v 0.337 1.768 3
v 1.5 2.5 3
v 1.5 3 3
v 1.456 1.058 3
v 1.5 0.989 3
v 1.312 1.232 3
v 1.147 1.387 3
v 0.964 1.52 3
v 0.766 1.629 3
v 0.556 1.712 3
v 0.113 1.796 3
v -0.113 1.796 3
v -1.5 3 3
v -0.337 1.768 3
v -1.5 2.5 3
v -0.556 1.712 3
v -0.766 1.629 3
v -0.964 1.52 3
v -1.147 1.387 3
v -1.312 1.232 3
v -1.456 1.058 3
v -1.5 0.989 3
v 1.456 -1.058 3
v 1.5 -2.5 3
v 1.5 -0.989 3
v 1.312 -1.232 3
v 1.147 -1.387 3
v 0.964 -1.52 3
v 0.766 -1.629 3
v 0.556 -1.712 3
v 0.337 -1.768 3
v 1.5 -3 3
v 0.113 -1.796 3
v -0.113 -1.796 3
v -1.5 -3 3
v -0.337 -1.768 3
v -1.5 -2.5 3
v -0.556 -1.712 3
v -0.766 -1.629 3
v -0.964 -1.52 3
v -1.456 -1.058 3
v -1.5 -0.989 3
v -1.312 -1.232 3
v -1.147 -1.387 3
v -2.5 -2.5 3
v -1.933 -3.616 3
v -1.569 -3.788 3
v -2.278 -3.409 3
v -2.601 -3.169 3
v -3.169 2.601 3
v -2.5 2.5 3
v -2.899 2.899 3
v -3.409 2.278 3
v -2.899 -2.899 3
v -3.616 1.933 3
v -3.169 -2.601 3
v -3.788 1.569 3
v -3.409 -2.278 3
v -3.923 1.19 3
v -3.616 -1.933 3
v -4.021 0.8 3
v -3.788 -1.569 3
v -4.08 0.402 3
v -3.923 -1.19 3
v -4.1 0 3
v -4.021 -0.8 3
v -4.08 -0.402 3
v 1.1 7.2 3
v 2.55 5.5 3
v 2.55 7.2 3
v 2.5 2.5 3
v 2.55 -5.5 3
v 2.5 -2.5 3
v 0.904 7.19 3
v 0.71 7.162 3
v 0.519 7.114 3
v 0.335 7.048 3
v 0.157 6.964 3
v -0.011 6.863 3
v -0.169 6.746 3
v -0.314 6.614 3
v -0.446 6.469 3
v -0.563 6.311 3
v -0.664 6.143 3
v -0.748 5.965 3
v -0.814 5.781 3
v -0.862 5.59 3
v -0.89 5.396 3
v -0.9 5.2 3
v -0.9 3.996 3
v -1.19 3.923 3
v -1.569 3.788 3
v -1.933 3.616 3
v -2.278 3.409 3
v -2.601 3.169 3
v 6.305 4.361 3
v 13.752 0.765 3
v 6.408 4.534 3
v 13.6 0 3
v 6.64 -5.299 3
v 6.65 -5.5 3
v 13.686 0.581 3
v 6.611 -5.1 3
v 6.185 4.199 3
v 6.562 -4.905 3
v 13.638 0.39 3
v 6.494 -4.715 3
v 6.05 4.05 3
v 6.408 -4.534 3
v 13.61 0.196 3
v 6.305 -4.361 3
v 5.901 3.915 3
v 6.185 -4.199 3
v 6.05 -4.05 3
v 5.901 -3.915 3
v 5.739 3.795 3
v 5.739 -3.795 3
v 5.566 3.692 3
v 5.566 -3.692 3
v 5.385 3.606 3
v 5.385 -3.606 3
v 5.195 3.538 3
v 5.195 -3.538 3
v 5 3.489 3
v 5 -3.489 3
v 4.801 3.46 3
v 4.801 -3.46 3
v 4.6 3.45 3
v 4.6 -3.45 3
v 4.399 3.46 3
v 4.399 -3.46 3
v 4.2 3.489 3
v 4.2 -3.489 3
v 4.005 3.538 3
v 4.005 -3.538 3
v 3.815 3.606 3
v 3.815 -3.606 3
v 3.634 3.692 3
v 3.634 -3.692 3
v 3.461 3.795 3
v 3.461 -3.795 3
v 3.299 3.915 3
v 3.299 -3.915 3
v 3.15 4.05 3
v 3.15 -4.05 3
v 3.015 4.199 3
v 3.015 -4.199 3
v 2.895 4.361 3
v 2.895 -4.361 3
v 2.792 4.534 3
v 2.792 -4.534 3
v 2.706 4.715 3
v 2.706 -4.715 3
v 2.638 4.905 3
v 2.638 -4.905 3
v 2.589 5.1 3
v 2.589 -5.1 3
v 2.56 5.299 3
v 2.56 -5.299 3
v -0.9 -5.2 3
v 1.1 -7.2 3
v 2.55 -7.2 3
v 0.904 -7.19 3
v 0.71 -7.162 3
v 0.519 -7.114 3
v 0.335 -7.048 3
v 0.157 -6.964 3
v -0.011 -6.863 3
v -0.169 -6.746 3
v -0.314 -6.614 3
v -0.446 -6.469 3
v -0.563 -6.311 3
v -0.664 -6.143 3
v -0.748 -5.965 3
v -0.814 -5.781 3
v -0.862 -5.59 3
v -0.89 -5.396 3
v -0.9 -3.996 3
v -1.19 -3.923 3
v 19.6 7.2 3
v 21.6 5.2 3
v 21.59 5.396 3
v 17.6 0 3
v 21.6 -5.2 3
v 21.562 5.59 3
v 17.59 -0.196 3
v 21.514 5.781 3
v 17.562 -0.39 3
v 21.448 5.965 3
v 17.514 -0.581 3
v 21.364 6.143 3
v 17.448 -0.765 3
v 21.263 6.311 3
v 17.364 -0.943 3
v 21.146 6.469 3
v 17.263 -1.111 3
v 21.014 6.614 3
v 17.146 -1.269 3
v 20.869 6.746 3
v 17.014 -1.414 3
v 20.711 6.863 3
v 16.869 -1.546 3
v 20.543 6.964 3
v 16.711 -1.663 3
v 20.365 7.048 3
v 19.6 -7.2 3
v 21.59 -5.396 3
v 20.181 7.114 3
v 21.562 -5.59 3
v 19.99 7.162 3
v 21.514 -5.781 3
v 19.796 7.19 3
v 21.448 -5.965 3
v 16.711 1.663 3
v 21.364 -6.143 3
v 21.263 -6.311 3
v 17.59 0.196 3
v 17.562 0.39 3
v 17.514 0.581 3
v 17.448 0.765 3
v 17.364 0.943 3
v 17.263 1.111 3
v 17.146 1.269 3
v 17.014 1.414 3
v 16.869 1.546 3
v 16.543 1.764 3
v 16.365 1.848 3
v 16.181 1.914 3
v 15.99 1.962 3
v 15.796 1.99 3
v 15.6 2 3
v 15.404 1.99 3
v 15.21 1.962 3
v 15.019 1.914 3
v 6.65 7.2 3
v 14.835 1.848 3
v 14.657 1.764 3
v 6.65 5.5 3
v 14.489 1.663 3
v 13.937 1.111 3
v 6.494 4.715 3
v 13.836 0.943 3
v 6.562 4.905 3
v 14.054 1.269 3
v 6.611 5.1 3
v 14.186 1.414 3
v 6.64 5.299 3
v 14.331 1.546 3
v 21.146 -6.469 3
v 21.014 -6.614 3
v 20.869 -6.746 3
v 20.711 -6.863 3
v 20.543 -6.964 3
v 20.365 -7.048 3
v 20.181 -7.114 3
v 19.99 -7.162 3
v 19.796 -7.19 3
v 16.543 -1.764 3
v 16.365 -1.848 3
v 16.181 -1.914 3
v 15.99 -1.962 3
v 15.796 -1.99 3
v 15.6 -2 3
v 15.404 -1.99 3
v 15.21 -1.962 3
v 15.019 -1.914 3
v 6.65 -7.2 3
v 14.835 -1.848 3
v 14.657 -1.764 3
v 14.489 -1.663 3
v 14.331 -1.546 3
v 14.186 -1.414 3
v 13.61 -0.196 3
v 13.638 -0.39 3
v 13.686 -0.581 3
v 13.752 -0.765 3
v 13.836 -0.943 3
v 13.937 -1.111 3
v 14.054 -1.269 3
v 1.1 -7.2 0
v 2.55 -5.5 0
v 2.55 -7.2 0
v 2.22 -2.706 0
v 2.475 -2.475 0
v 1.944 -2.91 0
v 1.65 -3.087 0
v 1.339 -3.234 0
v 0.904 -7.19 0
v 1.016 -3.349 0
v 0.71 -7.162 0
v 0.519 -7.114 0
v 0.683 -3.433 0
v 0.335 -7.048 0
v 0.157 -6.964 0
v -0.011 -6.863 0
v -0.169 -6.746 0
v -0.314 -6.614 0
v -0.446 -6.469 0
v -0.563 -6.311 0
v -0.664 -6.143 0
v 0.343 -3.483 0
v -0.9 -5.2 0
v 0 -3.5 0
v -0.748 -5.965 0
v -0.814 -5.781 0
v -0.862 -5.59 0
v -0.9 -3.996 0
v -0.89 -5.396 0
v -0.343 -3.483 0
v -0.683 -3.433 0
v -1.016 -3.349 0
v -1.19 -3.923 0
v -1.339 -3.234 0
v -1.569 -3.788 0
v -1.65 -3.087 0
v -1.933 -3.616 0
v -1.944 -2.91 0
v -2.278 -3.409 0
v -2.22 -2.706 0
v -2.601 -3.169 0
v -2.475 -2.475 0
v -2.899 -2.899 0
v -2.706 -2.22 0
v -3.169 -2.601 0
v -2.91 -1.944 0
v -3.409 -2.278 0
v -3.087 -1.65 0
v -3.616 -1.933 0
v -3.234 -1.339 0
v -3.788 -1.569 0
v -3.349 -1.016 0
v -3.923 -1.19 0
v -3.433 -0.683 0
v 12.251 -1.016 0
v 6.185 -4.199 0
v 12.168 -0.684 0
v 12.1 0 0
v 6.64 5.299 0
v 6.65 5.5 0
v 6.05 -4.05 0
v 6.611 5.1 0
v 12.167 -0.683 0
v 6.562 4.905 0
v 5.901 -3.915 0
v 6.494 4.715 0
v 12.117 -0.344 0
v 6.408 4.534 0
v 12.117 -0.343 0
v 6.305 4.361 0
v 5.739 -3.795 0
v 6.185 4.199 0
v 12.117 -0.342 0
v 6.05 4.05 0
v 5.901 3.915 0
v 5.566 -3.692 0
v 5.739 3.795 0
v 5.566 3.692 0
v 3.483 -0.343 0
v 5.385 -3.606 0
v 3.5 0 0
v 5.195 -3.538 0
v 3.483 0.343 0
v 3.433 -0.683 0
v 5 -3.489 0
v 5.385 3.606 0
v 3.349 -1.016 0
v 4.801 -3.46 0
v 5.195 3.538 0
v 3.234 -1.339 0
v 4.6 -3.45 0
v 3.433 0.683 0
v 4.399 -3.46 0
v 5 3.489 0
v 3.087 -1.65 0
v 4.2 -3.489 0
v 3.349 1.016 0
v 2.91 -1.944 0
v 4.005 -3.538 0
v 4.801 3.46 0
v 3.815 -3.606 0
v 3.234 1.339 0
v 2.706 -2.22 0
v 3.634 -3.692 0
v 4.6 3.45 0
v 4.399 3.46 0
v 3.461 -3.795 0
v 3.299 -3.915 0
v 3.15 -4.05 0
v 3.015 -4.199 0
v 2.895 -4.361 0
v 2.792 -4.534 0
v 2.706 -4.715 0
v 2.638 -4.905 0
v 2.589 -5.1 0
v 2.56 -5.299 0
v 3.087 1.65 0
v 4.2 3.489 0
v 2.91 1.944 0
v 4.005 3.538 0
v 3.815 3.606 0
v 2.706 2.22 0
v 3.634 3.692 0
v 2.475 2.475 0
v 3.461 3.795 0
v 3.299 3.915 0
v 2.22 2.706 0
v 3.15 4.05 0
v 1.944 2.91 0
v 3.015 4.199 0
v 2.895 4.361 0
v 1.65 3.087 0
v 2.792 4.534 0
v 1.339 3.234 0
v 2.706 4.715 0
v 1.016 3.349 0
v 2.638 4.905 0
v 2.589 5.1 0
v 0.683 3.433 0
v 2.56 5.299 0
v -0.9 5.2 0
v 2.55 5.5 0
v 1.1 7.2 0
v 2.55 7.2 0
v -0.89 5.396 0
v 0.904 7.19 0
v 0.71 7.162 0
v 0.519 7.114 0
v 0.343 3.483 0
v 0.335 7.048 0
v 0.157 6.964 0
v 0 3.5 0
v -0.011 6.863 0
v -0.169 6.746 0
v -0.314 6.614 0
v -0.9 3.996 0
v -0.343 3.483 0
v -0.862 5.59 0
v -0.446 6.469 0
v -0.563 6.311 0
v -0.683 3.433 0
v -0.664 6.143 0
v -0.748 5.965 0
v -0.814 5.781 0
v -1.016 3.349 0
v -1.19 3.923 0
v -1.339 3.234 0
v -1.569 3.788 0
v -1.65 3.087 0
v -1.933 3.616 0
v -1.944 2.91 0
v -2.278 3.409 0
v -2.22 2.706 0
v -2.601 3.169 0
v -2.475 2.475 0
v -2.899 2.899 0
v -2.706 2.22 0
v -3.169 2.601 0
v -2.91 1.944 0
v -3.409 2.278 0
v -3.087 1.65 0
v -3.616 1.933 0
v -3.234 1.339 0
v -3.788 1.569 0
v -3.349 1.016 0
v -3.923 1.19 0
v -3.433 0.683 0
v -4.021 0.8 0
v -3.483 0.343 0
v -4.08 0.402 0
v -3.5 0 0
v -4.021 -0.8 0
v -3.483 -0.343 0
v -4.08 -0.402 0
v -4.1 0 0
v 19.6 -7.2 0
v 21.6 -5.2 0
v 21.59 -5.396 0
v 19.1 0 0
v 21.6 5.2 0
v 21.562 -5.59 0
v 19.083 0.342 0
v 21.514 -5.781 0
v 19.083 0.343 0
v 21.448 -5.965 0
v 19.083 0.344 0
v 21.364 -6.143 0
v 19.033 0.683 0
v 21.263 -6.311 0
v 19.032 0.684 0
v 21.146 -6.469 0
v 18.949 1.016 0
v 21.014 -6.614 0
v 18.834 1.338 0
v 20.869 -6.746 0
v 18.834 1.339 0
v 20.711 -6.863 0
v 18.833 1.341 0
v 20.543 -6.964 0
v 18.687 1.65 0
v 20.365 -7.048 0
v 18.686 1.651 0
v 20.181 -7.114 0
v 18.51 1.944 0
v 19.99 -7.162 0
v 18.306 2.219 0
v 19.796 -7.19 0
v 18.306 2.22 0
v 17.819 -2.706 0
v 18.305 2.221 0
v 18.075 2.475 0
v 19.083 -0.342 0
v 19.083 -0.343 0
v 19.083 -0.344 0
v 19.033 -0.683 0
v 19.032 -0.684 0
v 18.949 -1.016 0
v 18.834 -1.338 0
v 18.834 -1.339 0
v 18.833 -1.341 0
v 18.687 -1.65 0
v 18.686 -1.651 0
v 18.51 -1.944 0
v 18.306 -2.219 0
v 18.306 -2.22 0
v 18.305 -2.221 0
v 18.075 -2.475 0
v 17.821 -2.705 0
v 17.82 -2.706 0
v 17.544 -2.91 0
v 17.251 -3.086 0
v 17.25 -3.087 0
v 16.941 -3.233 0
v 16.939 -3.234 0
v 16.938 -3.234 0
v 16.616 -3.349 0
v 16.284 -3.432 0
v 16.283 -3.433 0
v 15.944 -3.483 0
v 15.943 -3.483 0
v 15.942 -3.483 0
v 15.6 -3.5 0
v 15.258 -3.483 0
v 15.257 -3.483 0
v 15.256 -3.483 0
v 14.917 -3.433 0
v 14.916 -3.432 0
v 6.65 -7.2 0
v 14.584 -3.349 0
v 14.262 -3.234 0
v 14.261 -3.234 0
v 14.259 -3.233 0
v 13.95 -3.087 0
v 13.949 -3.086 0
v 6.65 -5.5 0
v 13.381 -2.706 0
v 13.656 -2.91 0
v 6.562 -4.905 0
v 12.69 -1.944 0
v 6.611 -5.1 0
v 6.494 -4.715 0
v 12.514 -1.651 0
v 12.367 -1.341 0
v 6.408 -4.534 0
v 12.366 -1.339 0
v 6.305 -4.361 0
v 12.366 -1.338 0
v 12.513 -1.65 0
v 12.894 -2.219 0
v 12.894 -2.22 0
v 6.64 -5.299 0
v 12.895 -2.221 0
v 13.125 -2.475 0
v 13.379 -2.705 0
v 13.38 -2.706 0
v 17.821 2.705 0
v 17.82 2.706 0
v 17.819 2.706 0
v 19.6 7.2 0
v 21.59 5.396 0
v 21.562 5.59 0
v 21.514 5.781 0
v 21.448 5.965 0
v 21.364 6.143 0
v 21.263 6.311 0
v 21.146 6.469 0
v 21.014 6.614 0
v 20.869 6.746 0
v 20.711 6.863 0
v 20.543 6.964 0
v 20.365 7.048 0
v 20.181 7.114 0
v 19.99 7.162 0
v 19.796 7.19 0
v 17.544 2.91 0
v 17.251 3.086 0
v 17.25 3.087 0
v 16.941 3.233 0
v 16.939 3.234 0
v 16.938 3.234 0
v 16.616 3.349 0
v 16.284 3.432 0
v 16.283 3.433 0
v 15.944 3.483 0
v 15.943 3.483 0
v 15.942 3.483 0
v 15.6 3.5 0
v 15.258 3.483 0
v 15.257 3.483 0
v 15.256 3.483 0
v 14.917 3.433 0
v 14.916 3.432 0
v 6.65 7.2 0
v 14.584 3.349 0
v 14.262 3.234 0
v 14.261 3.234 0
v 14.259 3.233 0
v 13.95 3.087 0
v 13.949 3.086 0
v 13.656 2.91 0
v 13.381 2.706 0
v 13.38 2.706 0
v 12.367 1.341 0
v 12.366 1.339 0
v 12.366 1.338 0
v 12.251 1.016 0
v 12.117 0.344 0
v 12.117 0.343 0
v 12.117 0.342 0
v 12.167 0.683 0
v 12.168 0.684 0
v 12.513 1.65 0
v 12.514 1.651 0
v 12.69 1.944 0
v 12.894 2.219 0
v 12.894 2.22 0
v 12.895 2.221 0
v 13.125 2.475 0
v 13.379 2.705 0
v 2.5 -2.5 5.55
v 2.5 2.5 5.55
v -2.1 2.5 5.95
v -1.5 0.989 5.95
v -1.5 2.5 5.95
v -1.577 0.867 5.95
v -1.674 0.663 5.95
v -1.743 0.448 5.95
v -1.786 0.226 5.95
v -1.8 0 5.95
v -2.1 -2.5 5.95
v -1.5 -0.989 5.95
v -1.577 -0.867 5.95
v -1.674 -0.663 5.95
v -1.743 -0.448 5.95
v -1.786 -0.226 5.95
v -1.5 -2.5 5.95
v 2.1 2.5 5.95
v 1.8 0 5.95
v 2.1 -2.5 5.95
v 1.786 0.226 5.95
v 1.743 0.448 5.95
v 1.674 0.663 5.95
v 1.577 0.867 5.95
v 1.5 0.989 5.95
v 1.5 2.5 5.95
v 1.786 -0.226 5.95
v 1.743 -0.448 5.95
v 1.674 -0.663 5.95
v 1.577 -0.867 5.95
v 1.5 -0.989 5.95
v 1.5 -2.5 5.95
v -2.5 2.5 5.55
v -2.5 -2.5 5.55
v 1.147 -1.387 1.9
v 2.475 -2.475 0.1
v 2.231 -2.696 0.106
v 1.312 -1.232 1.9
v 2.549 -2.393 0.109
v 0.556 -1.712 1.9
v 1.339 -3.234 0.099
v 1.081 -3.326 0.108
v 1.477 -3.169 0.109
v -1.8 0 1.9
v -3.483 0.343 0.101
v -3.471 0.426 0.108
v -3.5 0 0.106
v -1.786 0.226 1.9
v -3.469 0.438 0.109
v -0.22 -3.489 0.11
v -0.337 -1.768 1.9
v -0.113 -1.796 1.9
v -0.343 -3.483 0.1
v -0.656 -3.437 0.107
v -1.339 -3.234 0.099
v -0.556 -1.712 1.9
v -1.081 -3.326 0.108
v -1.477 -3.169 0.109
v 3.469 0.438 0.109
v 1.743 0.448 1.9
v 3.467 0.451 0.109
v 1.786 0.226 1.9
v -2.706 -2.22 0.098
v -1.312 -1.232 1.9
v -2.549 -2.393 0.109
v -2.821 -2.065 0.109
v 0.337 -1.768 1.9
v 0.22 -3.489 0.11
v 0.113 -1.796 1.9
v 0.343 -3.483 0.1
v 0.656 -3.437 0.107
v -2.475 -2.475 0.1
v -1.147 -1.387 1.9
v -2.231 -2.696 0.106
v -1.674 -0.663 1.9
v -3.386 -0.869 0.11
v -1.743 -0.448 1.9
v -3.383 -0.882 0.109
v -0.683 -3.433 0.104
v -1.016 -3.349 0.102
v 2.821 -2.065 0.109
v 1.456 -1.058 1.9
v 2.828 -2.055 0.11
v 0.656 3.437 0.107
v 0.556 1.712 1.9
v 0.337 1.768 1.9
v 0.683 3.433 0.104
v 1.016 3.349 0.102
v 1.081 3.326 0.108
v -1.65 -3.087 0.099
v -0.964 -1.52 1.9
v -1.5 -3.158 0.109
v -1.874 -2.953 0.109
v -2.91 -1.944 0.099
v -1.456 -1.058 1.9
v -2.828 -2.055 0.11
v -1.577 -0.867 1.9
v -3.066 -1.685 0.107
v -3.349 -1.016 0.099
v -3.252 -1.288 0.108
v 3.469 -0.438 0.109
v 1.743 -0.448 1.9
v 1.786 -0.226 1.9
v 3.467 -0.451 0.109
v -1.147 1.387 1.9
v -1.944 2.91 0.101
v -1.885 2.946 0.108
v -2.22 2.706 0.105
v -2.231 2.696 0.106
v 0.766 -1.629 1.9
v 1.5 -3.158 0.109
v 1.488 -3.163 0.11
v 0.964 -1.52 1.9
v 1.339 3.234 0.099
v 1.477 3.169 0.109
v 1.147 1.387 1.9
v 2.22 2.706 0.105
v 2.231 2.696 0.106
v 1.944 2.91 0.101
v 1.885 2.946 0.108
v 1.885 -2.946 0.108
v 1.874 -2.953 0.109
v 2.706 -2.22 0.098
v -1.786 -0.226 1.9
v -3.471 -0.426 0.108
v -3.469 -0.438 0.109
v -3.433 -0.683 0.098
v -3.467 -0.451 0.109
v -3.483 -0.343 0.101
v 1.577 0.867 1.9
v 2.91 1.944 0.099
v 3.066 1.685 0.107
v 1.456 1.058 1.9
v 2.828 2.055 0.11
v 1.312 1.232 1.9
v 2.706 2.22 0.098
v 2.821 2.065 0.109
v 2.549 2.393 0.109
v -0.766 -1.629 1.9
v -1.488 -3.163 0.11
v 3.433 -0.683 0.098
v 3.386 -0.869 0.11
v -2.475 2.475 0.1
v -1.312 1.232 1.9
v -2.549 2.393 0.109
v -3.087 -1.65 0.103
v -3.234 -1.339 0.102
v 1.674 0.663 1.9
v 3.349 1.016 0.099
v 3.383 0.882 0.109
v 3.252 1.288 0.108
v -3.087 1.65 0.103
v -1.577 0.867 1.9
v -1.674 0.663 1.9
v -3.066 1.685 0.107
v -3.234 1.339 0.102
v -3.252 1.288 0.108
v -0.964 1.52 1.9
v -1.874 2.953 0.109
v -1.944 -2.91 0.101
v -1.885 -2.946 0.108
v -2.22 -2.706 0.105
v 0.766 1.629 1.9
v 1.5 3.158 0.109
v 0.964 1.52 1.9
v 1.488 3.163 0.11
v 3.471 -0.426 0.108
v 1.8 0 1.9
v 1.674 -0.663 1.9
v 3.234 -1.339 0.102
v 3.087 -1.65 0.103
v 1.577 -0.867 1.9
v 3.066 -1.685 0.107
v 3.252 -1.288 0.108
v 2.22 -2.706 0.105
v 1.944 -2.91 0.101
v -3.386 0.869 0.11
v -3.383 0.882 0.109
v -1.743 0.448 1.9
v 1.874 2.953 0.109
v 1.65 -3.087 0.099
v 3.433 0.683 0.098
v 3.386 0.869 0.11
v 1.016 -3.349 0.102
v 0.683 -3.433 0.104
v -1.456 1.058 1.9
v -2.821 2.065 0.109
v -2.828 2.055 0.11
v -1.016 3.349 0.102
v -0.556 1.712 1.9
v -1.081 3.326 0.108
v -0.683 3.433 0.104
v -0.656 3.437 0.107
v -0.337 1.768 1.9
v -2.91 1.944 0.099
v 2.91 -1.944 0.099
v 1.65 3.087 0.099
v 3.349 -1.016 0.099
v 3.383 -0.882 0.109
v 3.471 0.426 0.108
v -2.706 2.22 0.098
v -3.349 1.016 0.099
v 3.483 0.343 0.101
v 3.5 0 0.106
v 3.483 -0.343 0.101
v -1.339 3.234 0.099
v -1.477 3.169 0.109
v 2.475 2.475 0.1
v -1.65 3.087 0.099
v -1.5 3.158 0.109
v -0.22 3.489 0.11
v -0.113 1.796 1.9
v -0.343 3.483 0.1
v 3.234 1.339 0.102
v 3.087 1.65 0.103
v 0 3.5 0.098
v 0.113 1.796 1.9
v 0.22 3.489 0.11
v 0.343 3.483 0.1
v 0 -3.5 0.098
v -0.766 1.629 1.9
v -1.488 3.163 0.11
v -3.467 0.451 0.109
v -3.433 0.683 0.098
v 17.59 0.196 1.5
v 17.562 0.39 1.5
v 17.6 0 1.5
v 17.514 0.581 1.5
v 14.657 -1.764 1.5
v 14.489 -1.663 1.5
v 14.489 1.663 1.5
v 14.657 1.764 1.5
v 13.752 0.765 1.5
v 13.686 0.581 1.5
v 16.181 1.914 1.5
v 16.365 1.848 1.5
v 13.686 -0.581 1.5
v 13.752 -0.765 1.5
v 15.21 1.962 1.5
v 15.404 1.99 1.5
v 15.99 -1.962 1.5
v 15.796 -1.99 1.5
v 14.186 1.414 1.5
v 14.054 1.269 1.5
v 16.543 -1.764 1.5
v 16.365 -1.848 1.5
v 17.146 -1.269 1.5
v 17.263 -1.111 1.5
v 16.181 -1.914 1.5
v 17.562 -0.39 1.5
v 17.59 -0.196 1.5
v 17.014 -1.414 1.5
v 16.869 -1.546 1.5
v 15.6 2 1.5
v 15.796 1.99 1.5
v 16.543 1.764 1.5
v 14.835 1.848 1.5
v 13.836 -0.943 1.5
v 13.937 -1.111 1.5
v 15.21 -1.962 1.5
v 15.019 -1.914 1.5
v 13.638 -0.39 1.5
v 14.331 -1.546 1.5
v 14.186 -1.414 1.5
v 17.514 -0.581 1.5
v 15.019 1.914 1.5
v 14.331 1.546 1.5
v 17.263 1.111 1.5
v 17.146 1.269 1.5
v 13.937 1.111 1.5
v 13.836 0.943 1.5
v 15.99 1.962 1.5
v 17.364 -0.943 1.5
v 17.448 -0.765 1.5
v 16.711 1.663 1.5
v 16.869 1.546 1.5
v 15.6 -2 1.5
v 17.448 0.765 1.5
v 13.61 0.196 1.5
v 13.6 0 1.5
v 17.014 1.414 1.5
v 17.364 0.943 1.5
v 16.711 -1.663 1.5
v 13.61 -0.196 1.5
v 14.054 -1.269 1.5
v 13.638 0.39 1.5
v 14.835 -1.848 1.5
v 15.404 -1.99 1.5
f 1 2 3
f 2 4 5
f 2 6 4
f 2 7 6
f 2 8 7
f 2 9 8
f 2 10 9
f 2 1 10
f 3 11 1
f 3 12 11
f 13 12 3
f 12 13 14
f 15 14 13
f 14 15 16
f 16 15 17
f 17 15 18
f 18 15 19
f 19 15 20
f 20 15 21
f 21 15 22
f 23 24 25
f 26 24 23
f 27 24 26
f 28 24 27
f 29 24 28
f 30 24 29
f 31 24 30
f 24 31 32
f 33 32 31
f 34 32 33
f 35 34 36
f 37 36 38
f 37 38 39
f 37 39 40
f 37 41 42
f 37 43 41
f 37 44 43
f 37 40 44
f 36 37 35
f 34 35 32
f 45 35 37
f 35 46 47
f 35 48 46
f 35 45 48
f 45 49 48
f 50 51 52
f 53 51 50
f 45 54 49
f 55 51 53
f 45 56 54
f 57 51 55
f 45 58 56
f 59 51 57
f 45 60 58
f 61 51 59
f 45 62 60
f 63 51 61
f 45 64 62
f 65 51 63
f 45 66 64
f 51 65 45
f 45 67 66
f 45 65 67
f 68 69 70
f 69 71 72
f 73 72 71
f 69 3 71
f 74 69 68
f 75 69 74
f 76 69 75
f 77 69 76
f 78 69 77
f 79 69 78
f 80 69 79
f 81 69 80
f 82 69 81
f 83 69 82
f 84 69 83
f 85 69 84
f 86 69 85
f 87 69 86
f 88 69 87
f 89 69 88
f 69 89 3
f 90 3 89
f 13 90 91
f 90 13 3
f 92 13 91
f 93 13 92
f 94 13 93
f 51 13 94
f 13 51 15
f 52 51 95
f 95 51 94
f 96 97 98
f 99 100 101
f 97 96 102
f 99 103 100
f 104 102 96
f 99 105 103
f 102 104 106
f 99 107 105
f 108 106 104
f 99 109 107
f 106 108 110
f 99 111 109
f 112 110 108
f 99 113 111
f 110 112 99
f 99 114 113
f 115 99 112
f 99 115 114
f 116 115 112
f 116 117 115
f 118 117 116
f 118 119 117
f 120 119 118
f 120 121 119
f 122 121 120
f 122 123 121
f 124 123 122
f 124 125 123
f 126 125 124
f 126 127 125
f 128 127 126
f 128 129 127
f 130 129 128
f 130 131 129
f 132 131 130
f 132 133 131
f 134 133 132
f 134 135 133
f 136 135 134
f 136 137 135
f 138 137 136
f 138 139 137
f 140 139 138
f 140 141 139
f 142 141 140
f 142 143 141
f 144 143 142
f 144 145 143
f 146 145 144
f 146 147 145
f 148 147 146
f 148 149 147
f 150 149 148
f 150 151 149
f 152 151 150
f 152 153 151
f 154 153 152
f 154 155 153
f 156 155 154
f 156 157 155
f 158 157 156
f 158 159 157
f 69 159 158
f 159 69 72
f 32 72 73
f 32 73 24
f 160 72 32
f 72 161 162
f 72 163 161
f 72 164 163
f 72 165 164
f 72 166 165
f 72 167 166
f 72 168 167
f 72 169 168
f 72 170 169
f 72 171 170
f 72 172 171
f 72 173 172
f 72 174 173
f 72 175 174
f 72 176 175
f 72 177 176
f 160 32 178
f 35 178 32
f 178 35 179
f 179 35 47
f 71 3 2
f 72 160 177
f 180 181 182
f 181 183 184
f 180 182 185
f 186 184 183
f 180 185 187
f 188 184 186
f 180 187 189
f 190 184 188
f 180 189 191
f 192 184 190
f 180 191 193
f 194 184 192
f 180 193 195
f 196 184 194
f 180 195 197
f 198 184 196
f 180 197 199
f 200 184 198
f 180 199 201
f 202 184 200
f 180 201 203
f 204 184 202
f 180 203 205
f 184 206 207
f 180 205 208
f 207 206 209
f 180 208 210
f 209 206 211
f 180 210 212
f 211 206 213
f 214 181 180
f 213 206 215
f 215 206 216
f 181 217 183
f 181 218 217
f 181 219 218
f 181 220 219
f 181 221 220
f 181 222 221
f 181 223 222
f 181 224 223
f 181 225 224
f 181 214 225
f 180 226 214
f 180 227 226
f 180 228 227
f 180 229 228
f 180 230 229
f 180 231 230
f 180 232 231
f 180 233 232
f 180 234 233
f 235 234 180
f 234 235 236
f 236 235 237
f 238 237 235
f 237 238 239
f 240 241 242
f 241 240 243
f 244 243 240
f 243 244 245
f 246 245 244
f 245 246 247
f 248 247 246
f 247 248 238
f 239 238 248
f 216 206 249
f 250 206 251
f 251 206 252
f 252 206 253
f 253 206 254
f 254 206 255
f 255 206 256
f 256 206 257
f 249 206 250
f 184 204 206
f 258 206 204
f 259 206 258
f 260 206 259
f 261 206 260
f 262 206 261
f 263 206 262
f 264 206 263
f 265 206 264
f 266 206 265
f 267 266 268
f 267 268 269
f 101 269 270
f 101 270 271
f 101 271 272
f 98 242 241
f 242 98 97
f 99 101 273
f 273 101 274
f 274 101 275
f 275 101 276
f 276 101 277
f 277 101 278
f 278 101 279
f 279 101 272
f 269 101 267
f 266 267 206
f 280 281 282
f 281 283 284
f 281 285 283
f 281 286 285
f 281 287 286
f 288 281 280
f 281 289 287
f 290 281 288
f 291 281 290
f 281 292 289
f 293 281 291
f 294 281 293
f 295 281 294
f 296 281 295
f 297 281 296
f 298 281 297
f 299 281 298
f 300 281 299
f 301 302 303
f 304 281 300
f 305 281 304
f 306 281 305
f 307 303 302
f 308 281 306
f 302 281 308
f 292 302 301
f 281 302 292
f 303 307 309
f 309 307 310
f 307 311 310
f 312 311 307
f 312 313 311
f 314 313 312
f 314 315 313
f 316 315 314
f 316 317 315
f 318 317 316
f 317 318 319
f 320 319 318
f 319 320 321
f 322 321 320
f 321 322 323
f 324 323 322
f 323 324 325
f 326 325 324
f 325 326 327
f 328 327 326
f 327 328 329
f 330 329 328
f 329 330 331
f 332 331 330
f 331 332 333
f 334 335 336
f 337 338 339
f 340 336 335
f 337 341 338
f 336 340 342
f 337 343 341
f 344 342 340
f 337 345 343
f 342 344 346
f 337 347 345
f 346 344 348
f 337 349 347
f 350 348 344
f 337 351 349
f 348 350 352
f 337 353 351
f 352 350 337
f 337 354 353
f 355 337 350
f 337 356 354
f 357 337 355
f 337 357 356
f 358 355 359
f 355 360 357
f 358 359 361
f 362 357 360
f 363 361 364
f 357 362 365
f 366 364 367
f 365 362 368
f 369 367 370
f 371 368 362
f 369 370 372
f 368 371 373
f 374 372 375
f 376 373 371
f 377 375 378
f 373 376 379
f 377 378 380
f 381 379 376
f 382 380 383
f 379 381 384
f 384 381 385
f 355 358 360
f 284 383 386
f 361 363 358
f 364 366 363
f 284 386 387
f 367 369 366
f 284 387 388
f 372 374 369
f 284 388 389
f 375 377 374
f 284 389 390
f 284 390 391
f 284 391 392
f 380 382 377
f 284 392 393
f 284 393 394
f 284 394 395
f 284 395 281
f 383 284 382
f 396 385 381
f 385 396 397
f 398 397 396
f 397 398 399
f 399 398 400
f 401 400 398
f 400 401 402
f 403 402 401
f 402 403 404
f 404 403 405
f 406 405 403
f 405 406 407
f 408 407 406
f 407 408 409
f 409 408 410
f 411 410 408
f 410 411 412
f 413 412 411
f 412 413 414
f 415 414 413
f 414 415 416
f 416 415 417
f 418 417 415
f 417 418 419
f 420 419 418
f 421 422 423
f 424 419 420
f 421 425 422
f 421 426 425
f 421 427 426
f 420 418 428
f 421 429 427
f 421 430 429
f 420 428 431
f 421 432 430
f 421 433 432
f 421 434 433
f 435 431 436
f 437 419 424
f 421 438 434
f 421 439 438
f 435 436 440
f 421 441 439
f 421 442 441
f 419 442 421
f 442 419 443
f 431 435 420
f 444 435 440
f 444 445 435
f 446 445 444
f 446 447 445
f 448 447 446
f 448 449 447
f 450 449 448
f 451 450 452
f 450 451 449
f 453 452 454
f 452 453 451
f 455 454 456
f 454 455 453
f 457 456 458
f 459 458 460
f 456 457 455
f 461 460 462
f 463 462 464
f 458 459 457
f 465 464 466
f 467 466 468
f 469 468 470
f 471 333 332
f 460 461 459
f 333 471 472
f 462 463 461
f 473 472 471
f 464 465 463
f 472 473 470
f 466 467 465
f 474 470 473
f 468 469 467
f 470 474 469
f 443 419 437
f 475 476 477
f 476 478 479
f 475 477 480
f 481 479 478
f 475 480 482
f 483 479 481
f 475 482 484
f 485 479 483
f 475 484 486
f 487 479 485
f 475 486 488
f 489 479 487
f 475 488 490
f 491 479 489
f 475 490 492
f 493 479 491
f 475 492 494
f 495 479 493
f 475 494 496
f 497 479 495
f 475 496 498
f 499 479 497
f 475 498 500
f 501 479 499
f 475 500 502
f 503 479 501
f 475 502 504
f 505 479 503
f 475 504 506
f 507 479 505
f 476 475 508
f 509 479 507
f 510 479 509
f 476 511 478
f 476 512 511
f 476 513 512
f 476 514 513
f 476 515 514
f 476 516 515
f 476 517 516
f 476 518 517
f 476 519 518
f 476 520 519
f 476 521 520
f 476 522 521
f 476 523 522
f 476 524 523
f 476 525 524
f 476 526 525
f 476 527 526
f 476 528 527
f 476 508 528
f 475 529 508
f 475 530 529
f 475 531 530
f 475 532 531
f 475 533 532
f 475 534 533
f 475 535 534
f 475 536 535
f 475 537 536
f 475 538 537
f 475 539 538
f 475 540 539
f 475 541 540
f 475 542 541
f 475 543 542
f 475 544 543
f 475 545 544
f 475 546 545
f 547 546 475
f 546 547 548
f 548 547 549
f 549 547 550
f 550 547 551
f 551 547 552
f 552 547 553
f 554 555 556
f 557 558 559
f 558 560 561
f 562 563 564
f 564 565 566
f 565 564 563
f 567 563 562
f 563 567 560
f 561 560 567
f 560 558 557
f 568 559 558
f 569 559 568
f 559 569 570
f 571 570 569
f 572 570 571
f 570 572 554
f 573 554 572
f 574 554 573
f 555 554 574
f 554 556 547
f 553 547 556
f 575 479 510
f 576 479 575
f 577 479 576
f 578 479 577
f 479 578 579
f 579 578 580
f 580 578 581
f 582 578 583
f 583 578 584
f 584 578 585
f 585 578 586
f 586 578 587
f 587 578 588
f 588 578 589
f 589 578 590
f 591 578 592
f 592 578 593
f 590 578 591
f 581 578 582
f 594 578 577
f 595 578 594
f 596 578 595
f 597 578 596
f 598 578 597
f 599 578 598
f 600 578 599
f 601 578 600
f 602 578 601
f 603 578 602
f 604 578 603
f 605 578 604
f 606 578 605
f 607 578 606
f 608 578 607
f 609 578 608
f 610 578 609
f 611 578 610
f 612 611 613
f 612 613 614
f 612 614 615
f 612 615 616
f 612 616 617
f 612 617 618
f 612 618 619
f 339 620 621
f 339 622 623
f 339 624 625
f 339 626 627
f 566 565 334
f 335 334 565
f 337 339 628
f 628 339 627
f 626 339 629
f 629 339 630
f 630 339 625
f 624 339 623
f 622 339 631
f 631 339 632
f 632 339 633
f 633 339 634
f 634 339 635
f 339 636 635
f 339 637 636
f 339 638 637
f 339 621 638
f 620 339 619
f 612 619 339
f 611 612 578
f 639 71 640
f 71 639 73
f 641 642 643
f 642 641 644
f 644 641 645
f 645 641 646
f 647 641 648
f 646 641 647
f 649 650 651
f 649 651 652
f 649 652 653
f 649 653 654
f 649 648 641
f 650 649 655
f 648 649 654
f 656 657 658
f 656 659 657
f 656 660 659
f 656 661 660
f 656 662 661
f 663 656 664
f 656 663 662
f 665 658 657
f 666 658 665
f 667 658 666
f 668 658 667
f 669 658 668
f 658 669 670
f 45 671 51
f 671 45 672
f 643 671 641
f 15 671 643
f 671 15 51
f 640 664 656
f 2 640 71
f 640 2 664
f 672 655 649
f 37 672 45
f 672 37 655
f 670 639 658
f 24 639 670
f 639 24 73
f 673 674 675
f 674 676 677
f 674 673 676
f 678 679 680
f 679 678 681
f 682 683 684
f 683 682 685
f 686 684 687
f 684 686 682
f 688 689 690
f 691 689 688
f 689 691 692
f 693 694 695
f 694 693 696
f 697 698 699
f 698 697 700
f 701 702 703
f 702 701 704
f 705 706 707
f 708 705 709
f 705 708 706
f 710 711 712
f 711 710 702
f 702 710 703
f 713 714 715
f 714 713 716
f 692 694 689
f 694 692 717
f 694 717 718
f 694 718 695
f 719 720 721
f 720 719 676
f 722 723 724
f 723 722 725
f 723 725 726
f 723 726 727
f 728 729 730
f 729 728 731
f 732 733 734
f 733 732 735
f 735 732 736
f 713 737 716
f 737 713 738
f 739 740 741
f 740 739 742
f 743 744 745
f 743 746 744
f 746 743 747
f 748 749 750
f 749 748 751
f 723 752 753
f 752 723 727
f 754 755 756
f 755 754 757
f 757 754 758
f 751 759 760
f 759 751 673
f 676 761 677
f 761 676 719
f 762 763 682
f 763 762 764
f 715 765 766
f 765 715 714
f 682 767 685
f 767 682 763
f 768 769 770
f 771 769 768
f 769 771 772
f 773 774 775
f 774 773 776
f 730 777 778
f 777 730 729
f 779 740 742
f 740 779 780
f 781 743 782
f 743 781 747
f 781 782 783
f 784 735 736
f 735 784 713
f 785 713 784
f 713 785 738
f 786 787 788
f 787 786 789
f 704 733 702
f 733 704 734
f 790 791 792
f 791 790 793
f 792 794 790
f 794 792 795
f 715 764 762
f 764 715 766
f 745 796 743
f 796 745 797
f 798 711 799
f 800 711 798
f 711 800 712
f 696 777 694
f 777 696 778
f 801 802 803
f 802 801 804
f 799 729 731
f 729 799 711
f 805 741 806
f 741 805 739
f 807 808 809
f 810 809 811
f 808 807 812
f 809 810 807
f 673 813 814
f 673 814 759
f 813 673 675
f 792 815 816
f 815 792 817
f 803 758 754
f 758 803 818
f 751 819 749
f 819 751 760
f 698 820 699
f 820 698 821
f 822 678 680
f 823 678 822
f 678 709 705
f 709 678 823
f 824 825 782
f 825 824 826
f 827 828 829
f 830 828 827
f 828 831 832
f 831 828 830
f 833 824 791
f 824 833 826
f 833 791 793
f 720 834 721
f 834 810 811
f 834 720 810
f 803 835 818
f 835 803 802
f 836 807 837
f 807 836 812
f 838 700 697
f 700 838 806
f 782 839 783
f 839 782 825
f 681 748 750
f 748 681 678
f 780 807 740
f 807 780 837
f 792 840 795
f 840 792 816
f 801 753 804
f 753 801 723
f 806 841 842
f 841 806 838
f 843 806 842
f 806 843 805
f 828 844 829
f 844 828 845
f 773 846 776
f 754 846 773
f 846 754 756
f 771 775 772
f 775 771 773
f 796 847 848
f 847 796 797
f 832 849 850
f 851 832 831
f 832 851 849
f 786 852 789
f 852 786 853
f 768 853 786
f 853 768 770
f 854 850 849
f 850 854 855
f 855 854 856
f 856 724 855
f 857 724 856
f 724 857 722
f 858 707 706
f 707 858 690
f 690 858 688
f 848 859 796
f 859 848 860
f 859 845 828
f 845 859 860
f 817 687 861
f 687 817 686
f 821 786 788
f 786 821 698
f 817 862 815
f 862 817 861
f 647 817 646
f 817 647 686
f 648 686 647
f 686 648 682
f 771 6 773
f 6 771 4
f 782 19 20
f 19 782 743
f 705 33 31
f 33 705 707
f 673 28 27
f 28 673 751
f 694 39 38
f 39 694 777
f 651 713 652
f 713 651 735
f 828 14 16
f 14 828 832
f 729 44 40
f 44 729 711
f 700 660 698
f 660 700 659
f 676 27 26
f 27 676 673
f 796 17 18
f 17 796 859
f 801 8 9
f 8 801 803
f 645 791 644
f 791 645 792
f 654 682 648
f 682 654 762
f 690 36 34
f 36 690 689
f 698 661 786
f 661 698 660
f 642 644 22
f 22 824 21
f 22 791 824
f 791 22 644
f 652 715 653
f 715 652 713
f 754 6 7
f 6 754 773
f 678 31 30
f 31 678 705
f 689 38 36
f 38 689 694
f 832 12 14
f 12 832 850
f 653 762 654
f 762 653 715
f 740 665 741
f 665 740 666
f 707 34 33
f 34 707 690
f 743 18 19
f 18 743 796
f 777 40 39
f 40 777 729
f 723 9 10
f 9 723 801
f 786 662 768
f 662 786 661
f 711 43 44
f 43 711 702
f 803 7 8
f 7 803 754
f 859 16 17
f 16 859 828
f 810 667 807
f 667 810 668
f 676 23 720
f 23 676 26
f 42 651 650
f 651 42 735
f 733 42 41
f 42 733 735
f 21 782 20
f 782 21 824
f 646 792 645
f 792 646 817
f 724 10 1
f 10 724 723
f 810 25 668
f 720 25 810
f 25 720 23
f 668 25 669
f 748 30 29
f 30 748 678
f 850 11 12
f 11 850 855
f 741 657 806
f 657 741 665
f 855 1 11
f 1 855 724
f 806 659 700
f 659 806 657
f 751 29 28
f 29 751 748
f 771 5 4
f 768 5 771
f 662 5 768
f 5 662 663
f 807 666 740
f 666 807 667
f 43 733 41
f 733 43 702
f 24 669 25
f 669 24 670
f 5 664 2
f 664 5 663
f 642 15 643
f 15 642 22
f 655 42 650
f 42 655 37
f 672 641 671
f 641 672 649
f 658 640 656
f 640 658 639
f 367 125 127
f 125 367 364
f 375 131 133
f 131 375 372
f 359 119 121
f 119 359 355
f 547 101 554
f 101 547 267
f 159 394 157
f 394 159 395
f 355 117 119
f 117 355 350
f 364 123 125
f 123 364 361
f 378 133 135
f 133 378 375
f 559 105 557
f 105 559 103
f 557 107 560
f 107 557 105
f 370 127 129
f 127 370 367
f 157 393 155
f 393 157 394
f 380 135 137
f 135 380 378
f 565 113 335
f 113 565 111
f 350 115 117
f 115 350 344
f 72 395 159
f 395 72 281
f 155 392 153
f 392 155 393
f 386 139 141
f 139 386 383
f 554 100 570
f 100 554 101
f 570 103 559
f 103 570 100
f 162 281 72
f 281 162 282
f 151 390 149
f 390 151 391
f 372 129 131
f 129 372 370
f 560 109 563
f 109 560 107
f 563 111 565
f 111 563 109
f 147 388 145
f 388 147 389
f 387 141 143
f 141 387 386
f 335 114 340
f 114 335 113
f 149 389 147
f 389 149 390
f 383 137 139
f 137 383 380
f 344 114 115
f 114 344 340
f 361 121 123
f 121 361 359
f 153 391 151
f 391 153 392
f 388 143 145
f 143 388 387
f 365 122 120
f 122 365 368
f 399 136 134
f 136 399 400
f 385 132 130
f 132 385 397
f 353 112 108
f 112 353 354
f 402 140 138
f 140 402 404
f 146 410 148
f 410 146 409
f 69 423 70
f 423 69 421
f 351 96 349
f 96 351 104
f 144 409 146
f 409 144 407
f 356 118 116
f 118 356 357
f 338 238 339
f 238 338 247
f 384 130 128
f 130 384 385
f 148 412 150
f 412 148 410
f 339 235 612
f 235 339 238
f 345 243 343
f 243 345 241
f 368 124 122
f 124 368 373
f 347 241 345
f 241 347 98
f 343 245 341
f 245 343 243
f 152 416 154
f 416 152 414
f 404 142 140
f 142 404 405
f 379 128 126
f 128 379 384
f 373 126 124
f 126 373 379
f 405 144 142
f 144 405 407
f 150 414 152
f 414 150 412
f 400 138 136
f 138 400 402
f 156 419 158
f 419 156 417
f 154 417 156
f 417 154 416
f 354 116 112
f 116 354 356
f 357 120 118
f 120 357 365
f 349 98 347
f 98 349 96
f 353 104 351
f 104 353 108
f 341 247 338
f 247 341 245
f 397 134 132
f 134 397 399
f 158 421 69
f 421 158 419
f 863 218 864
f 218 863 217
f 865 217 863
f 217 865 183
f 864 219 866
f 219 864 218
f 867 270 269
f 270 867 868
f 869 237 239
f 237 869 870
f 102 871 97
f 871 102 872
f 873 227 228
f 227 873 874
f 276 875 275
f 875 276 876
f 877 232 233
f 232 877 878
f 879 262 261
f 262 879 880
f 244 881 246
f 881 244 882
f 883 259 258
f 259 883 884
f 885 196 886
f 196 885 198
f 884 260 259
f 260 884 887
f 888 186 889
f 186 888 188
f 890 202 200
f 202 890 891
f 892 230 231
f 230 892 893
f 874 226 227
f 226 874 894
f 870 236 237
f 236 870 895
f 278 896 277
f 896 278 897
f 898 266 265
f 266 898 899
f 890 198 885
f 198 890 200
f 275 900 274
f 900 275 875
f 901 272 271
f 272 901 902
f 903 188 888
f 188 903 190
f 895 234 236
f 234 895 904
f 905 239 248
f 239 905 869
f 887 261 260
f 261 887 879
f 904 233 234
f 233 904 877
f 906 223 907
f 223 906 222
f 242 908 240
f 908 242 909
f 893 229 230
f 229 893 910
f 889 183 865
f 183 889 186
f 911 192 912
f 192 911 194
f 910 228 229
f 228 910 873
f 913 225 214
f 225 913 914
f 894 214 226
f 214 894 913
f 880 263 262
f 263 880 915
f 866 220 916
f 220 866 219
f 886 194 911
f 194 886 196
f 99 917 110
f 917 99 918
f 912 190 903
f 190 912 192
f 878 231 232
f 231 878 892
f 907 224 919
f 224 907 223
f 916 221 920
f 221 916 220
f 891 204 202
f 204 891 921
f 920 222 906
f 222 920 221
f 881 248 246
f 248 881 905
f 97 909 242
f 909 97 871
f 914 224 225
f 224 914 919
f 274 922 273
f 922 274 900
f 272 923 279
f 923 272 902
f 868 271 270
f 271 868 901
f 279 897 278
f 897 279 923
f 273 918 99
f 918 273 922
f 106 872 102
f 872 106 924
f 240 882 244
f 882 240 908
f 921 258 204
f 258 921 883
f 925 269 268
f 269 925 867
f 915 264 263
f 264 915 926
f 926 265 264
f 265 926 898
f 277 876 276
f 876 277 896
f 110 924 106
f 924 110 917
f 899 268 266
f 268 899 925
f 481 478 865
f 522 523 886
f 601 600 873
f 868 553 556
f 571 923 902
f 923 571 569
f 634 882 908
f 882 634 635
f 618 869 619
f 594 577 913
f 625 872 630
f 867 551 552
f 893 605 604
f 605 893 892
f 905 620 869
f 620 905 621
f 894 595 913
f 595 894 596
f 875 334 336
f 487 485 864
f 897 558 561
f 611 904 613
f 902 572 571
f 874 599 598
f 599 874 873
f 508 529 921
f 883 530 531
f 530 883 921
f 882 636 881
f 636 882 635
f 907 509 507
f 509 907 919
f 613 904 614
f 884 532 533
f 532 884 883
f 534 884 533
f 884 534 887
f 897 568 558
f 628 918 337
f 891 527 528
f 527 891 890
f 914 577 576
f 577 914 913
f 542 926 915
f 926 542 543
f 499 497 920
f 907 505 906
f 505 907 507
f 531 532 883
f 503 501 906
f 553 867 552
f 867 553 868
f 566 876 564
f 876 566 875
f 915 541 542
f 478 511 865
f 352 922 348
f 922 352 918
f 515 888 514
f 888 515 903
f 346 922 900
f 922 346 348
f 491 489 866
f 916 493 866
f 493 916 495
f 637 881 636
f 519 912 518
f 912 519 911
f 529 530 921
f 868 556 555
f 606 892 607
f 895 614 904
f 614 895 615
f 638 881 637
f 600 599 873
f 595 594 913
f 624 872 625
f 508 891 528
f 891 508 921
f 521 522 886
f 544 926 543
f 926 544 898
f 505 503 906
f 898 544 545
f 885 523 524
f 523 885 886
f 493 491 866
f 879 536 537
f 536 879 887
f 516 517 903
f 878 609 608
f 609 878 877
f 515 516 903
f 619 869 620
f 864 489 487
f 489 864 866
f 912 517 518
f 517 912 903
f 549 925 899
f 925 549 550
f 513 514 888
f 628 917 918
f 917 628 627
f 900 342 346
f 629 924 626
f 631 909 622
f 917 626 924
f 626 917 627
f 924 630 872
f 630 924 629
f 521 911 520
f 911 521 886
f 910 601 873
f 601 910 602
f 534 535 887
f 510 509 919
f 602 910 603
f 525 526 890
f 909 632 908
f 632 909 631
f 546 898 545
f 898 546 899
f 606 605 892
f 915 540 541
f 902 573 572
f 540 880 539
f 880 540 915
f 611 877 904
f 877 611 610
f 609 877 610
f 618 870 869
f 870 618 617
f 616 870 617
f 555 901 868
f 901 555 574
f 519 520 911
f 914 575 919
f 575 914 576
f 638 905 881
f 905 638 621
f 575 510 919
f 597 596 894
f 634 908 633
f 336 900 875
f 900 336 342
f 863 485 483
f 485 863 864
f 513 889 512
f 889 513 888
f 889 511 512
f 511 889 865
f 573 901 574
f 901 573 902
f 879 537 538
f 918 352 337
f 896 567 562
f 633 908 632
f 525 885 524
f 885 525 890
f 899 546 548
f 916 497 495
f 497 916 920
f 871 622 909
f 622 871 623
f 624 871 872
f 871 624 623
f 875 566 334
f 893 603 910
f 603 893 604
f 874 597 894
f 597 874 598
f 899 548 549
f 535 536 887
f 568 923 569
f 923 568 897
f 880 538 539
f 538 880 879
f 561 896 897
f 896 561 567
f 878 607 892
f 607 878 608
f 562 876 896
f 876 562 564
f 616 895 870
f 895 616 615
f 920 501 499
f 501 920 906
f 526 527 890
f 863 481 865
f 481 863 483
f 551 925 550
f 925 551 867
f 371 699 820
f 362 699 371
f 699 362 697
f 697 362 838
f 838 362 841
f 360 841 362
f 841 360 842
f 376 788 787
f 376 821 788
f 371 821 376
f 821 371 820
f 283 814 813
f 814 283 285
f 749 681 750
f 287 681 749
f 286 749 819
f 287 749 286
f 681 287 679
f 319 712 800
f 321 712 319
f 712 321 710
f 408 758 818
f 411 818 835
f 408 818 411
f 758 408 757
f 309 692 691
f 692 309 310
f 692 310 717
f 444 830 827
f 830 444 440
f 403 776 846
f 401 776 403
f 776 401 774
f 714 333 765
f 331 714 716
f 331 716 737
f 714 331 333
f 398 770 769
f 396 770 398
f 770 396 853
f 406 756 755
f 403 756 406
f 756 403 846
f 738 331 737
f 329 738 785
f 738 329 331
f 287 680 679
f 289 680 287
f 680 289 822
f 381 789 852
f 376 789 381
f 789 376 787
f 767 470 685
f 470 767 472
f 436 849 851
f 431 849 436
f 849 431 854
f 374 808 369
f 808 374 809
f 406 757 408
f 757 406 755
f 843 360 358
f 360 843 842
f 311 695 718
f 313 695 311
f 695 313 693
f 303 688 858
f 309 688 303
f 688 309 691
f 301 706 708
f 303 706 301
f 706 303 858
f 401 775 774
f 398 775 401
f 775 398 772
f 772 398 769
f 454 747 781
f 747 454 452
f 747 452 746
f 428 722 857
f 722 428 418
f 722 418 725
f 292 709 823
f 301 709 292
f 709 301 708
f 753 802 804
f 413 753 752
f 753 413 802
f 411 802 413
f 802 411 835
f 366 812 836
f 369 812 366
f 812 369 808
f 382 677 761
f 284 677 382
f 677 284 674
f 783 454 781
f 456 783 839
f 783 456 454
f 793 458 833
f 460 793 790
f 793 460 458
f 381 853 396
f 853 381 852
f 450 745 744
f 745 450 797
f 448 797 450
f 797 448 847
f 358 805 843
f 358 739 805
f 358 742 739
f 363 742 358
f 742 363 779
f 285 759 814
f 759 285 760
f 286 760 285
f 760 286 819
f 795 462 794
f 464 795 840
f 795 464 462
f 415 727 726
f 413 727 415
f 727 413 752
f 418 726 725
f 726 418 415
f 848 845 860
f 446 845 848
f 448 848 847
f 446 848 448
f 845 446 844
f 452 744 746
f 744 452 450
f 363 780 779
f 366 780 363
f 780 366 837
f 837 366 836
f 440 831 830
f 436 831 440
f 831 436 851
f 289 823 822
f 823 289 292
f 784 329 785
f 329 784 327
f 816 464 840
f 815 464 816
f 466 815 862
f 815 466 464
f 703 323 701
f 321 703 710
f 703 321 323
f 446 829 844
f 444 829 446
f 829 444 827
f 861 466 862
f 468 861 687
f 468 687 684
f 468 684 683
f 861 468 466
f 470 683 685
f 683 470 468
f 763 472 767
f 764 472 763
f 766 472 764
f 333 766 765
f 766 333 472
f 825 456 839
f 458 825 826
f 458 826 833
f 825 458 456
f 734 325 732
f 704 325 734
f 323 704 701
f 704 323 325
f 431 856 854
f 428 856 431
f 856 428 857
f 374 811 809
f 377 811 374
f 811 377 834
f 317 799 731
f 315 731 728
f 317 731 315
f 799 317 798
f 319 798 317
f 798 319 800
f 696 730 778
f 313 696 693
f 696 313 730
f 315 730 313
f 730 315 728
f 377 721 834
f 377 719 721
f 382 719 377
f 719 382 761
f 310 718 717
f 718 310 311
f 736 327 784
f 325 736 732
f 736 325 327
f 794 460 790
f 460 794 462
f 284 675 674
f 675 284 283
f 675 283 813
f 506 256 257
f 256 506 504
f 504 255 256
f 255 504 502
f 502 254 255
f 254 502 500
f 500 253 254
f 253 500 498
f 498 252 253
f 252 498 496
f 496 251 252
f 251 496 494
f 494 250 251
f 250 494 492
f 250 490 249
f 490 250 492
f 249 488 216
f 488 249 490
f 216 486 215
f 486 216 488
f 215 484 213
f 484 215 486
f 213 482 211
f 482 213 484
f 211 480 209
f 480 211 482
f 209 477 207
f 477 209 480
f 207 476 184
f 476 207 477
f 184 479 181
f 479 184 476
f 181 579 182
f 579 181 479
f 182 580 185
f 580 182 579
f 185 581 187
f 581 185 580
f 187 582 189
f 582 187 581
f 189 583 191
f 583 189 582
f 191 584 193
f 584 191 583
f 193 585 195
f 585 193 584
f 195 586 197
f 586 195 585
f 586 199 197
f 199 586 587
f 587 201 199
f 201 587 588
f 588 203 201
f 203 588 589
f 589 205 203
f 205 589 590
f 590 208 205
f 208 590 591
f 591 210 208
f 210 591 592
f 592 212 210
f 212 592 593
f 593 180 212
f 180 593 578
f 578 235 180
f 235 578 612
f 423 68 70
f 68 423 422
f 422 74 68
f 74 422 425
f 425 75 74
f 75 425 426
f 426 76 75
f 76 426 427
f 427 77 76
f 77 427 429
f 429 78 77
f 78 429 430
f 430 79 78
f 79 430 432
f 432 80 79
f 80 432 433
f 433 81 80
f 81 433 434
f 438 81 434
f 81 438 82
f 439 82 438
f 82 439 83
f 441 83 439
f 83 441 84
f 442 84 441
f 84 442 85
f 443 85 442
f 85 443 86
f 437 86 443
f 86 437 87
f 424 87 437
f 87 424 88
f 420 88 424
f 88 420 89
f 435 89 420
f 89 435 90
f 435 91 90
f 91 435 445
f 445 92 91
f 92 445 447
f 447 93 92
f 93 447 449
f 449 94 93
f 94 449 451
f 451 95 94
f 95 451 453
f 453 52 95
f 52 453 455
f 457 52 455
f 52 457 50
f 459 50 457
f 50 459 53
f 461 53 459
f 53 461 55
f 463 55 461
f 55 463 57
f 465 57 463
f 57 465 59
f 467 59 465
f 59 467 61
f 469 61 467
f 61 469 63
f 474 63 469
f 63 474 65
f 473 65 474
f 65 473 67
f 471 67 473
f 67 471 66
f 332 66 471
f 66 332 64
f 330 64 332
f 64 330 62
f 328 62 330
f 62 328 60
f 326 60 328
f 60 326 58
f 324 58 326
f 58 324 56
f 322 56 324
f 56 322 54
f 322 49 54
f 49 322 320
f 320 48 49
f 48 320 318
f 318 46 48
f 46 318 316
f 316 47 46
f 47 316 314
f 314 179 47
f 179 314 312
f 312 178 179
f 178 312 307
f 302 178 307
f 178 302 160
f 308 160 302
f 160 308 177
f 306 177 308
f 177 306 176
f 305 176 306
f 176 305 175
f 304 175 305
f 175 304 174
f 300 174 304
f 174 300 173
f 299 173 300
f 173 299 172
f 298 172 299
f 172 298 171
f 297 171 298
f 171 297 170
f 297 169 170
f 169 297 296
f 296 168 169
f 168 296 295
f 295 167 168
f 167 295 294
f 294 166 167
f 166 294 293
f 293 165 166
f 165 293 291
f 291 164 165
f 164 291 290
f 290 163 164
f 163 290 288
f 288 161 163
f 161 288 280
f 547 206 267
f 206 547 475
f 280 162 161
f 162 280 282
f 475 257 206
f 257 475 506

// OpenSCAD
// file: native_adapter.scad
$fn = 50;

difference() {
	union() {
		translate(v = [0, 0, 0]) {
			rotate(a = [0, 0, 0]) {
				difference() {
					union() {
						translate(v = [-0.35, 0, 0]) {
							hull() {
								translate(v = [-4.4, 4.25, 0]) {
									cylinder(h = 3.0, r = 0.75);
								}
								translate(v = [4.4, 4.25, 0]) {
									cylinder(h = 3.0, r = 0.75);
								}
								translate(v = [-4.4, -4.25, 0]) {
									cylinder(h = 3.0, r = 0.75);
								}
								translate(v = [4.4, -4.25, 0]) {
									cylinder(h = 3.0, r = 0.75);
								}
							}
						}
						translate(v = [-2.5, -2.5, 2.95]) {
							cube(size = [5.0, 5.0, 3.0]);
						}
					}
					union() {
						translate(v = [0, 0, 0]) {
							rotate(a = [0, 180, 0]) {
								difference() {
									union() {
										translate(v = [0, 0, -20.0]) {
											cylinder(h = 20.0, r = 1.5);
										}
										translate(v = [0, 0, -1.9]) {
											cylinder(h = 1.9, r1 = 1.8, r2 = 3.6);
										}
										cylinder(h = 250, r = 3.6);
										translate(v = [0, 0, -20.0]) {
											cylinder(h = 20.0, r = 1.8);
										}
										translate(v = [0, 0, -20.0]) {
											cylinder(h = 20.0, r = 1.5);
										}
									}
									union();
								}
							}
						}
						translate(v = [-1.5, -3.0, 3.0]) {
							cube(size = [3.0, 6.0, 3.0500000000000003]);
						}
						translate(v = [0, 2.6, 0]) {
							rotate(a = [90, 0, 0]) {
								linear_extrude(height = 5.2) {
									polygon(points = [[-2.7, 5.3500000000000005], [-1.9, 6.15], [-2.7, 6.15]]);
								}
							}
						}
						translate(v = [0, 2.6, 0]) {
							rotate(a = [90, 0, 0]) {
								linear_extrude(height = 5.2) {
									polygon(points = [[2.7, 5.3500000000000005], [1.9, 6.15], [2.7, 6.15]]);
								}
							}
						}
						translate(v = [-4.6, -5.5, -0.1]) {
							cylinder(h = 3.2, r = 3.15);
						}
						translate(v = [-4.6, 5.5, -0.1]) {
							cylinder(h = 3.2, r = 3.15);
						}
						translate(v = [4.6, -5.5, -0.1]) {
							cylinder(h = 3.2, r = 3.15);
						}
						translate(v = [4.6, 5.5, -0.1]) {
							cylinder(h = 3.2, r = 3.15);
						}
					}
				}
			}
		}
	}
	union();
}
// file: beam_joint_geometry.scad
$fn=64;
tie_t=3.0;
module native_adapter(){
include <native_adapter.scad>
}

module joint_bores(holes,wood,access) {
  for(slot=access) hull()
    for(y=[slot[1],slot[2]]) translate([slot[0],y,-.05]) cylinder(r=slot[3],h=tie_t+.1);
  // Leave the OOBB countersink and pilot cheeks of each native adapter intact.
  for(p=holes) translate([p[0],p[1],-.05]) cylinder(d=7,h=tie_t+.1);
  if(len(wood)) translate(wood) {
    translate([0,0,-.05]) cylinder(d=4,h=tie_t+.1);
    translate([0,0,-.01]) cylinder(d1=7.02,d2=4,h=1.51);
  }
}

module plate_outline(bounds) {
  r=2;
  offset(r=r) translate([bounds[0]+r,bounds[1]+r])
    square([bounds[2]-bounds[0]-2*r,bounds[3]-bounds[1]-2*r]);
}
module beam_joint(holes,bounds,wood=[],access=[]) {
  union(){
    for(p=holes) translate(p) intersection(){
      native_adapter();
      cylinder(r=4,h=12);
    }
    difference(){
      linear_extrude(tie_t) union(){
        plate_outline(bounds);
        for(p=holes) hull(){
          translate(p) circle(r=4.1);
          translate([p[0]+(p[0]==0 ? 3 : -3),p[1]]) circle(r=4.1);
        }
      }
      joint_bores(holes,wood,access);
    }
  }
}
// file: cabinet_geometry.scad
t=12;
inside_w=593.4000000000001;
inside_h=665.5000000000001;
cap_w=617.4000000000001;
depth=209.0;
face_t=6.0;
tie_t=3.0;
hole_x=89.3;
low_y=99.65;
stations=[22, 58.5, 104.5, 150.5, 187.0];
retainer_y=[22.6, 227.65, 449.95, 655.0];
$fn=64;

module cap_bores() {
  for (side=[-1,1], i=[0:4])
    translate([side*(inside_w/2+t/2),0,stations[i]]) rotate([-90,0,0])
      if (i%2==0) translate([0,0,-.01]) cylinder(d=6.1,h=8.01);
      else {
        translate([0,0,-.01]) cylinder(d=4,h=t+.02);
        translate([0,0,t-1.5]) cylinder(d1=4,d2=7.02,h=1.51);
      }
}
module side_bores() {
  for (bottom=[0,1], i=[0:4])
    translate([t/2,bottom*inside_h,stations[i]]) rotate([bottom?90:-90,0,0])
      translate([0,0,-.01]) cylinder(d=i%2?2.5:6.1,h=i%2?21.01:17.01);
  for (back=[0,1], y=retainer_y)
    translate([t/2,y,back*depth]) rotate([0,back?180:0,0])
      translate([0,0,-.01]) cylinder(d=2.5,h=16.01);
}

module cap_panel() {
  difference() {
    translate([-cap_w/2,0,0]) cube([cap_w,t,depth]);
    cap_bores();
  }
}
module side_panel() {
  difference() {
    cube([t,inside_h,depth]);
    side_bores();
  }
}
module wood_screw(length) {
  // Flush 90-degree head, nominal shank and tapered point. Thread envelope.
  difference(){
    union(){
      cylinder(h=1.75,d1=7,d2=3.5);
      translate([0,0,1.74]) cylinder(h=length-4.74,d=3.5);
      translate([0,0,length-3.01]) cylinder(h=3.01,d1=3.5,d2=0);
    }
    for(a=[0,90]) rotate([0,0,a]) translate([-2,-.4,-.01]) cube([4,.8,.81]);
  }
}
module dowel() {
  cylinder(h=.5,d1=5,d2=6);
  translate([0,0,.5]) cylinder(d=6,h=23);
  translate([0,0,23.5]) cylinder(h=.5,d1=6,d2=5);
}
// main file
include <cabinet_geometry.scad>
include <beam_joint_geometry.scad>
beam_joint([[0, 0]],[-0.9, -7.2, 21.6, 7.2],[15.6, 0.0],[[4.6, -8.0, -5.5, 2.05], [4.6, 5.5, 8.0, 2.05]]);
